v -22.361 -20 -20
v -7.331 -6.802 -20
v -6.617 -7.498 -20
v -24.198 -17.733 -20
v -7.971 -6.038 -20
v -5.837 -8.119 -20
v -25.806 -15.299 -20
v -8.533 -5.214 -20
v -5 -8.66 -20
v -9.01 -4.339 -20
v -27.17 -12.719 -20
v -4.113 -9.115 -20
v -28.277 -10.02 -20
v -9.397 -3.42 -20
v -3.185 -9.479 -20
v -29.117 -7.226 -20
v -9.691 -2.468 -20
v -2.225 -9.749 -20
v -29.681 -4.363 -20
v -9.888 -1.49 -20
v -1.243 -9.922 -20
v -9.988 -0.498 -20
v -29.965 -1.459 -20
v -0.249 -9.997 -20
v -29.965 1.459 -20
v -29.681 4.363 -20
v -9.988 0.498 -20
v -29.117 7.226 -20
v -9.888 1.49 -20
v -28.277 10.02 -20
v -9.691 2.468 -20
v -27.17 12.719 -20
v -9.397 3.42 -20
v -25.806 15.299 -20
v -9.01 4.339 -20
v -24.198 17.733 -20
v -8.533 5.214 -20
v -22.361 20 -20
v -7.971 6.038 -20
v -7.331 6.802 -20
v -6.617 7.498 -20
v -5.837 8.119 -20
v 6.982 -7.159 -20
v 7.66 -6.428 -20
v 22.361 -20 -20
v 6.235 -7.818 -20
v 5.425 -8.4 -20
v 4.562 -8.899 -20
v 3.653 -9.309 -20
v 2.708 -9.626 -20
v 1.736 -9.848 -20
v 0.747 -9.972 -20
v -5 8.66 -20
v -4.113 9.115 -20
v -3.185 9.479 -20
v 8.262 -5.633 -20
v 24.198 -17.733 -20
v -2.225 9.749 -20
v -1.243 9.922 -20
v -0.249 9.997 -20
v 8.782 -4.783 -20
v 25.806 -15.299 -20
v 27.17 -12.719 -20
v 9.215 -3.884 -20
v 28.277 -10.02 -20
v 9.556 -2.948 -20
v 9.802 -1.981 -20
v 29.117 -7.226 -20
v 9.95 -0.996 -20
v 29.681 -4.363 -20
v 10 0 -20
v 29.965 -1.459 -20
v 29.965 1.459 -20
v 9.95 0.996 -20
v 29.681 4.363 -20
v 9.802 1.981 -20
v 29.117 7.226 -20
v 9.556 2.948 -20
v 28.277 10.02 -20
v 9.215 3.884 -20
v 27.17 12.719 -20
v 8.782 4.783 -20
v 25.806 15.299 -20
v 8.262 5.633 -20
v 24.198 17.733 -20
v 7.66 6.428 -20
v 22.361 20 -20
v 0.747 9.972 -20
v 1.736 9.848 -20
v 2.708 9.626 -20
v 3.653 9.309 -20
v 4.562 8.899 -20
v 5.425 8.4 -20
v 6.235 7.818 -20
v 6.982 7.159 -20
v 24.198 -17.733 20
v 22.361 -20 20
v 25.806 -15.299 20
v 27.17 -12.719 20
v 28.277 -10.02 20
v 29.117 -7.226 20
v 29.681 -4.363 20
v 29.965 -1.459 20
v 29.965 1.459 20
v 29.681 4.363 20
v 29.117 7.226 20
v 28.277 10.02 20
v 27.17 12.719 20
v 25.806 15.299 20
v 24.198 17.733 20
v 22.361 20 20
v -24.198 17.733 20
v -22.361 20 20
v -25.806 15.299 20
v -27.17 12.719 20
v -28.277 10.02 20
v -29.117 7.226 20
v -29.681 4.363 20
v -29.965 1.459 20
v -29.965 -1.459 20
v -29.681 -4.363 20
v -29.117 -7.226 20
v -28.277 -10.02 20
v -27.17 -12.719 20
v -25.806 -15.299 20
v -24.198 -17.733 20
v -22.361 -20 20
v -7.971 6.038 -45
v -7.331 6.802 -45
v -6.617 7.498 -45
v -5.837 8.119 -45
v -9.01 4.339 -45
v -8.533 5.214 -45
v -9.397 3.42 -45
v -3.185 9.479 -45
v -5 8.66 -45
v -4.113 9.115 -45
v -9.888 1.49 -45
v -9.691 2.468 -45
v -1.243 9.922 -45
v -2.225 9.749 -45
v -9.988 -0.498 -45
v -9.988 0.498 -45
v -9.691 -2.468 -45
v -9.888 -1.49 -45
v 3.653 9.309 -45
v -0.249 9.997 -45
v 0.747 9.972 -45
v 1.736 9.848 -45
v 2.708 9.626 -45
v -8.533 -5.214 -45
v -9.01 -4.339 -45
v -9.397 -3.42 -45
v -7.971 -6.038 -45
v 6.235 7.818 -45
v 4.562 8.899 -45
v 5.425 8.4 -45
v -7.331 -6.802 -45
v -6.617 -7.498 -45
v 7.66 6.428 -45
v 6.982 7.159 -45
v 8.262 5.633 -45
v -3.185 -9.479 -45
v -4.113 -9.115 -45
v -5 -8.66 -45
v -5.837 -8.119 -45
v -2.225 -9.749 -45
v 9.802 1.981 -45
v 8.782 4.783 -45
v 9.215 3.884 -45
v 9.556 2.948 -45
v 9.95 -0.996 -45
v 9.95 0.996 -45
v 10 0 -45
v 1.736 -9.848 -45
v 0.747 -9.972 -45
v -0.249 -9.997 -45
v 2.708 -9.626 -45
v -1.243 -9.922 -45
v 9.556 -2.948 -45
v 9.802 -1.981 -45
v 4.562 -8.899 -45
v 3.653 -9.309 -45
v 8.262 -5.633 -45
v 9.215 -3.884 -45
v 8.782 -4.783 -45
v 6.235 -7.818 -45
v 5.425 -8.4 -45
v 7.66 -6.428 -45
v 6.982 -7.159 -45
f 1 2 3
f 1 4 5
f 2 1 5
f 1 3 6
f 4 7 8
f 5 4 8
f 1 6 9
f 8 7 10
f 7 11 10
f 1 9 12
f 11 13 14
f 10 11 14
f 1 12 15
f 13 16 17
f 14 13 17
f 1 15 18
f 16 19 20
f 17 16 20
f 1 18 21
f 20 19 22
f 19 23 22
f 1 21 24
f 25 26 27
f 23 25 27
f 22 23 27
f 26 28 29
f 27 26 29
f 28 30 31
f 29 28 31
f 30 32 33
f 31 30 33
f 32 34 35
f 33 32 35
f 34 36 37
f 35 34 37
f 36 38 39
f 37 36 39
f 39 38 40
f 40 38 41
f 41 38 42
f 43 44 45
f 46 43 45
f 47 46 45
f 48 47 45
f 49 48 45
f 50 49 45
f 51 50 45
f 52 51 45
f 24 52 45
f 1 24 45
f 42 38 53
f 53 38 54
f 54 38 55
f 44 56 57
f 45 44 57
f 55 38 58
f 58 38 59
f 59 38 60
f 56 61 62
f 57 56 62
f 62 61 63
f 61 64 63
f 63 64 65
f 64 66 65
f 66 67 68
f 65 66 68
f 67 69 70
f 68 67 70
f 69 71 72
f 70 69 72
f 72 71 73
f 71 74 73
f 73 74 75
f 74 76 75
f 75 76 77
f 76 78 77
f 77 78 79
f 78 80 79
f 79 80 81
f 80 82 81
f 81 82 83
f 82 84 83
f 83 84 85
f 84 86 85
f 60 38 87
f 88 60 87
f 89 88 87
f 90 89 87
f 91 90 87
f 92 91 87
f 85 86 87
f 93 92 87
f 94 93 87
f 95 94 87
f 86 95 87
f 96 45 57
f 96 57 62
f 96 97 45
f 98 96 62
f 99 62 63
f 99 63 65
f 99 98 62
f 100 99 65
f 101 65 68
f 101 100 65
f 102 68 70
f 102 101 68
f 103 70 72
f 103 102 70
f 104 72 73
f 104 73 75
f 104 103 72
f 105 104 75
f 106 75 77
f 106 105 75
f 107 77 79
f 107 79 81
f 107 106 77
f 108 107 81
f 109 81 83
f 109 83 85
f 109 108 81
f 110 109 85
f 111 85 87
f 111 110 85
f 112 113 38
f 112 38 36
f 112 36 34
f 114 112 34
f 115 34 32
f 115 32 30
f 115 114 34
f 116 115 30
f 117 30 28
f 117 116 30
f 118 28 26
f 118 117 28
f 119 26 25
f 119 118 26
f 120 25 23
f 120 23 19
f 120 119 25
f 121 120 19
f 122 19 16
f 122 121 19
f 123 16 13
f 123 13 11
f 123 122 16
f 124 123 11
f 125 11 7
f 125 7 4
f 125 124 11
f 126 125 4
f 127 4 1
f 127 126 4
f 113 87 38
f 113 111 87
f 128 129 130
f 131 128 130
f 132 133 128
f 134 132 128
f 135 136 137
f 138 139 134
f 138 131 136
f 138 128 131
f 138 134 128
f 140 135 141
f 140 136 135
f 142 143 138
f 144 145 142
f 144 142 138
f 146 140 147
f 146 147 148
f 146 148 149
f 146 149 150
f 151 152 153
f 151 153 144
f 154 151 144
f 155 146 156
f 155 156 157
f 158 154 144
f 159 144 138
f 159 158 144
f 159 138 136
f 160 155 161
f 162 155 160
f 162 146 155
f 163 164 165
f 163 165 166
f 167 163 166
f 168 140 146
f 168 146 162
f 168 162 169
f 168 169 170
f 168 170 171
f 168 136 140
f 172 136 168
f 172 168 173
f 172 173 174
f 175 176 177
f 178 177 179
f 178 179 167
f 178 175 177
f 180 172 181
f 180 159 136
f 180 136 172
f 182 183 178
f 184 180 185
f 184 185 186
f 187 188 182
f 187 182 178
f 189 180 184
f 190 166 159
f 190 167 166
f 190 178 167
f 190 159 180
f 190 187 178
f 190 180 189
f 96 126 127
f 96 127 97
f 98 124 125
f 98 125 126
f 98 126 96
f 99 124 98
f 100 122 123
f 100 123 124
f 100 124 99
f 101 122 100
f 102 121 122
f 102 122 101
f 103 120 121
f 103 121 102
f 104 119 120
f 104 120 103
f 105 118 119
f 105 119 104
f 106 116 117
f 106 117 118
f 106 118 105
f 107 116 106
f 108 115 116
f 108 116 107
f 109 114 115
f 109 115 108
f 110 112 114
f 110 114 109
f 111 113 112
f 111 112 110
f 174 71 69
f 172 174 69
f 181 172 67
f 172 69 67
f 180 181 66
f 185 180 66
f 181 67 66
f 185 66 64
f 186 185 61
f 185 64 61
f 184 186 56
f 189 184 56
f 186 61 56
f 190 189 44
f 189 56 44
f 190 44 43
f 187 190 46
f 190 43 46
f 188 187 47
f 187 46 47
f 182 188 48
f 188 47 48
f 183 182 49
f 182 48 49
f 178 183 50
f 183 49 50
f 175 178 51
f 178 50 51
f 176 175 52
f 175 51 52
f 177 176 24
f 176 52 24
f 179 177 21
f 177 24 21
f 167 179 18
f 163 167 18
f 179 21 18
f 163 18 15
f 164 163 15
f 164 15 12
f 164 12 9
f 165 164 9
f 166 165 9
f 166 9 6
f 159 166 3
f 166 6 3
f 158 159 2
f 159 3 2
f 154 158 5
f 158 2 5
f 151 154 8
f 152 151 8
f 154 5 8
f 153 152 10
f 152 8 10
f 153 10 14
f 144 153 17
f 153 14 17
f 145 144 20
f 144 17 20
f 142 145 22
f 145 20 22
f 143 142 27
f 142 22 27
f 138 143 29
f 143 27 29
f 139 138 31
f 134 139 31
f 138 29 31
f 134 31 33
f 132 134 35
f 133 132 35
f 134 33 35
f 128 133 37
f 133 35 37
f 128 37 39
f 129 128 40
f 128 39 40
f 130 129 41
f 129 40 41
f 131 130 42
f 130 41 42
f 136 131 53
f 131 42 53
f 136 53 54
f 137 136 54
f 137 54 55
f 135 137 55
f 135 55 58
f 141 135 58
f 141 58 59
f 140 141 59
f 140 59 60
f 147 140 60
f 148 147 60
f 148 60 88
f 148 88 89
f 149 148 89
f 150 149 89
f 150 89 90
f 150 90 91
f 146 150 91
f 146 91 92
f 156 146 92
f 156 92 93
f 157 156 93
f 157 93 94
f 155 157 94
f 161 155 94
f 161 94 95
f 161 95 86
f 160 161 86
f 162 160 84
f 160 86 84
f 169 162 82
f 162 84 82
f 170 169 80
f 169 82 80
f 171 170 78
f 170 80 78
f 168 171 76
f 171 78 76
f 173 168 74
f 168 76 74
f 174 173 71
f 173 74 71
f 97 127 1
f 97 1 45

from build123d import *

# Parameters (mm, degrees)
F1_DEPTH = 20
F2_R     = 10
F3_DEPTH = 25


with BuildPart() as f1:
    # F0 (on Top) → F1 (new body, symmetric)
    with BuildSketch(Plane.XY):
        with BuildLine():
            Line((22.36068, 20), (-22.36068, 20))
            ThreePointArc((-22.36068, 20), (-30, 0), (-22.36068, -20))
            Line((-22.36068, -20), (22.36068, -20))
            ThreePointArc((22.36068, -20), (30, 0), (22.36068, 20))
        make_face()
    extrude(amount=F1_DEPTH, both=True)

    # F2 (on face) → F3 (join)
    with BuildSketch(Plane(origin=(0, 0, -20), x_dir=(1, 0, 0), z_dir=(0, 0, -1))):
        Circle(F2_R)
    extrude(amount=F3_DEPTH)


solid = f1.part
